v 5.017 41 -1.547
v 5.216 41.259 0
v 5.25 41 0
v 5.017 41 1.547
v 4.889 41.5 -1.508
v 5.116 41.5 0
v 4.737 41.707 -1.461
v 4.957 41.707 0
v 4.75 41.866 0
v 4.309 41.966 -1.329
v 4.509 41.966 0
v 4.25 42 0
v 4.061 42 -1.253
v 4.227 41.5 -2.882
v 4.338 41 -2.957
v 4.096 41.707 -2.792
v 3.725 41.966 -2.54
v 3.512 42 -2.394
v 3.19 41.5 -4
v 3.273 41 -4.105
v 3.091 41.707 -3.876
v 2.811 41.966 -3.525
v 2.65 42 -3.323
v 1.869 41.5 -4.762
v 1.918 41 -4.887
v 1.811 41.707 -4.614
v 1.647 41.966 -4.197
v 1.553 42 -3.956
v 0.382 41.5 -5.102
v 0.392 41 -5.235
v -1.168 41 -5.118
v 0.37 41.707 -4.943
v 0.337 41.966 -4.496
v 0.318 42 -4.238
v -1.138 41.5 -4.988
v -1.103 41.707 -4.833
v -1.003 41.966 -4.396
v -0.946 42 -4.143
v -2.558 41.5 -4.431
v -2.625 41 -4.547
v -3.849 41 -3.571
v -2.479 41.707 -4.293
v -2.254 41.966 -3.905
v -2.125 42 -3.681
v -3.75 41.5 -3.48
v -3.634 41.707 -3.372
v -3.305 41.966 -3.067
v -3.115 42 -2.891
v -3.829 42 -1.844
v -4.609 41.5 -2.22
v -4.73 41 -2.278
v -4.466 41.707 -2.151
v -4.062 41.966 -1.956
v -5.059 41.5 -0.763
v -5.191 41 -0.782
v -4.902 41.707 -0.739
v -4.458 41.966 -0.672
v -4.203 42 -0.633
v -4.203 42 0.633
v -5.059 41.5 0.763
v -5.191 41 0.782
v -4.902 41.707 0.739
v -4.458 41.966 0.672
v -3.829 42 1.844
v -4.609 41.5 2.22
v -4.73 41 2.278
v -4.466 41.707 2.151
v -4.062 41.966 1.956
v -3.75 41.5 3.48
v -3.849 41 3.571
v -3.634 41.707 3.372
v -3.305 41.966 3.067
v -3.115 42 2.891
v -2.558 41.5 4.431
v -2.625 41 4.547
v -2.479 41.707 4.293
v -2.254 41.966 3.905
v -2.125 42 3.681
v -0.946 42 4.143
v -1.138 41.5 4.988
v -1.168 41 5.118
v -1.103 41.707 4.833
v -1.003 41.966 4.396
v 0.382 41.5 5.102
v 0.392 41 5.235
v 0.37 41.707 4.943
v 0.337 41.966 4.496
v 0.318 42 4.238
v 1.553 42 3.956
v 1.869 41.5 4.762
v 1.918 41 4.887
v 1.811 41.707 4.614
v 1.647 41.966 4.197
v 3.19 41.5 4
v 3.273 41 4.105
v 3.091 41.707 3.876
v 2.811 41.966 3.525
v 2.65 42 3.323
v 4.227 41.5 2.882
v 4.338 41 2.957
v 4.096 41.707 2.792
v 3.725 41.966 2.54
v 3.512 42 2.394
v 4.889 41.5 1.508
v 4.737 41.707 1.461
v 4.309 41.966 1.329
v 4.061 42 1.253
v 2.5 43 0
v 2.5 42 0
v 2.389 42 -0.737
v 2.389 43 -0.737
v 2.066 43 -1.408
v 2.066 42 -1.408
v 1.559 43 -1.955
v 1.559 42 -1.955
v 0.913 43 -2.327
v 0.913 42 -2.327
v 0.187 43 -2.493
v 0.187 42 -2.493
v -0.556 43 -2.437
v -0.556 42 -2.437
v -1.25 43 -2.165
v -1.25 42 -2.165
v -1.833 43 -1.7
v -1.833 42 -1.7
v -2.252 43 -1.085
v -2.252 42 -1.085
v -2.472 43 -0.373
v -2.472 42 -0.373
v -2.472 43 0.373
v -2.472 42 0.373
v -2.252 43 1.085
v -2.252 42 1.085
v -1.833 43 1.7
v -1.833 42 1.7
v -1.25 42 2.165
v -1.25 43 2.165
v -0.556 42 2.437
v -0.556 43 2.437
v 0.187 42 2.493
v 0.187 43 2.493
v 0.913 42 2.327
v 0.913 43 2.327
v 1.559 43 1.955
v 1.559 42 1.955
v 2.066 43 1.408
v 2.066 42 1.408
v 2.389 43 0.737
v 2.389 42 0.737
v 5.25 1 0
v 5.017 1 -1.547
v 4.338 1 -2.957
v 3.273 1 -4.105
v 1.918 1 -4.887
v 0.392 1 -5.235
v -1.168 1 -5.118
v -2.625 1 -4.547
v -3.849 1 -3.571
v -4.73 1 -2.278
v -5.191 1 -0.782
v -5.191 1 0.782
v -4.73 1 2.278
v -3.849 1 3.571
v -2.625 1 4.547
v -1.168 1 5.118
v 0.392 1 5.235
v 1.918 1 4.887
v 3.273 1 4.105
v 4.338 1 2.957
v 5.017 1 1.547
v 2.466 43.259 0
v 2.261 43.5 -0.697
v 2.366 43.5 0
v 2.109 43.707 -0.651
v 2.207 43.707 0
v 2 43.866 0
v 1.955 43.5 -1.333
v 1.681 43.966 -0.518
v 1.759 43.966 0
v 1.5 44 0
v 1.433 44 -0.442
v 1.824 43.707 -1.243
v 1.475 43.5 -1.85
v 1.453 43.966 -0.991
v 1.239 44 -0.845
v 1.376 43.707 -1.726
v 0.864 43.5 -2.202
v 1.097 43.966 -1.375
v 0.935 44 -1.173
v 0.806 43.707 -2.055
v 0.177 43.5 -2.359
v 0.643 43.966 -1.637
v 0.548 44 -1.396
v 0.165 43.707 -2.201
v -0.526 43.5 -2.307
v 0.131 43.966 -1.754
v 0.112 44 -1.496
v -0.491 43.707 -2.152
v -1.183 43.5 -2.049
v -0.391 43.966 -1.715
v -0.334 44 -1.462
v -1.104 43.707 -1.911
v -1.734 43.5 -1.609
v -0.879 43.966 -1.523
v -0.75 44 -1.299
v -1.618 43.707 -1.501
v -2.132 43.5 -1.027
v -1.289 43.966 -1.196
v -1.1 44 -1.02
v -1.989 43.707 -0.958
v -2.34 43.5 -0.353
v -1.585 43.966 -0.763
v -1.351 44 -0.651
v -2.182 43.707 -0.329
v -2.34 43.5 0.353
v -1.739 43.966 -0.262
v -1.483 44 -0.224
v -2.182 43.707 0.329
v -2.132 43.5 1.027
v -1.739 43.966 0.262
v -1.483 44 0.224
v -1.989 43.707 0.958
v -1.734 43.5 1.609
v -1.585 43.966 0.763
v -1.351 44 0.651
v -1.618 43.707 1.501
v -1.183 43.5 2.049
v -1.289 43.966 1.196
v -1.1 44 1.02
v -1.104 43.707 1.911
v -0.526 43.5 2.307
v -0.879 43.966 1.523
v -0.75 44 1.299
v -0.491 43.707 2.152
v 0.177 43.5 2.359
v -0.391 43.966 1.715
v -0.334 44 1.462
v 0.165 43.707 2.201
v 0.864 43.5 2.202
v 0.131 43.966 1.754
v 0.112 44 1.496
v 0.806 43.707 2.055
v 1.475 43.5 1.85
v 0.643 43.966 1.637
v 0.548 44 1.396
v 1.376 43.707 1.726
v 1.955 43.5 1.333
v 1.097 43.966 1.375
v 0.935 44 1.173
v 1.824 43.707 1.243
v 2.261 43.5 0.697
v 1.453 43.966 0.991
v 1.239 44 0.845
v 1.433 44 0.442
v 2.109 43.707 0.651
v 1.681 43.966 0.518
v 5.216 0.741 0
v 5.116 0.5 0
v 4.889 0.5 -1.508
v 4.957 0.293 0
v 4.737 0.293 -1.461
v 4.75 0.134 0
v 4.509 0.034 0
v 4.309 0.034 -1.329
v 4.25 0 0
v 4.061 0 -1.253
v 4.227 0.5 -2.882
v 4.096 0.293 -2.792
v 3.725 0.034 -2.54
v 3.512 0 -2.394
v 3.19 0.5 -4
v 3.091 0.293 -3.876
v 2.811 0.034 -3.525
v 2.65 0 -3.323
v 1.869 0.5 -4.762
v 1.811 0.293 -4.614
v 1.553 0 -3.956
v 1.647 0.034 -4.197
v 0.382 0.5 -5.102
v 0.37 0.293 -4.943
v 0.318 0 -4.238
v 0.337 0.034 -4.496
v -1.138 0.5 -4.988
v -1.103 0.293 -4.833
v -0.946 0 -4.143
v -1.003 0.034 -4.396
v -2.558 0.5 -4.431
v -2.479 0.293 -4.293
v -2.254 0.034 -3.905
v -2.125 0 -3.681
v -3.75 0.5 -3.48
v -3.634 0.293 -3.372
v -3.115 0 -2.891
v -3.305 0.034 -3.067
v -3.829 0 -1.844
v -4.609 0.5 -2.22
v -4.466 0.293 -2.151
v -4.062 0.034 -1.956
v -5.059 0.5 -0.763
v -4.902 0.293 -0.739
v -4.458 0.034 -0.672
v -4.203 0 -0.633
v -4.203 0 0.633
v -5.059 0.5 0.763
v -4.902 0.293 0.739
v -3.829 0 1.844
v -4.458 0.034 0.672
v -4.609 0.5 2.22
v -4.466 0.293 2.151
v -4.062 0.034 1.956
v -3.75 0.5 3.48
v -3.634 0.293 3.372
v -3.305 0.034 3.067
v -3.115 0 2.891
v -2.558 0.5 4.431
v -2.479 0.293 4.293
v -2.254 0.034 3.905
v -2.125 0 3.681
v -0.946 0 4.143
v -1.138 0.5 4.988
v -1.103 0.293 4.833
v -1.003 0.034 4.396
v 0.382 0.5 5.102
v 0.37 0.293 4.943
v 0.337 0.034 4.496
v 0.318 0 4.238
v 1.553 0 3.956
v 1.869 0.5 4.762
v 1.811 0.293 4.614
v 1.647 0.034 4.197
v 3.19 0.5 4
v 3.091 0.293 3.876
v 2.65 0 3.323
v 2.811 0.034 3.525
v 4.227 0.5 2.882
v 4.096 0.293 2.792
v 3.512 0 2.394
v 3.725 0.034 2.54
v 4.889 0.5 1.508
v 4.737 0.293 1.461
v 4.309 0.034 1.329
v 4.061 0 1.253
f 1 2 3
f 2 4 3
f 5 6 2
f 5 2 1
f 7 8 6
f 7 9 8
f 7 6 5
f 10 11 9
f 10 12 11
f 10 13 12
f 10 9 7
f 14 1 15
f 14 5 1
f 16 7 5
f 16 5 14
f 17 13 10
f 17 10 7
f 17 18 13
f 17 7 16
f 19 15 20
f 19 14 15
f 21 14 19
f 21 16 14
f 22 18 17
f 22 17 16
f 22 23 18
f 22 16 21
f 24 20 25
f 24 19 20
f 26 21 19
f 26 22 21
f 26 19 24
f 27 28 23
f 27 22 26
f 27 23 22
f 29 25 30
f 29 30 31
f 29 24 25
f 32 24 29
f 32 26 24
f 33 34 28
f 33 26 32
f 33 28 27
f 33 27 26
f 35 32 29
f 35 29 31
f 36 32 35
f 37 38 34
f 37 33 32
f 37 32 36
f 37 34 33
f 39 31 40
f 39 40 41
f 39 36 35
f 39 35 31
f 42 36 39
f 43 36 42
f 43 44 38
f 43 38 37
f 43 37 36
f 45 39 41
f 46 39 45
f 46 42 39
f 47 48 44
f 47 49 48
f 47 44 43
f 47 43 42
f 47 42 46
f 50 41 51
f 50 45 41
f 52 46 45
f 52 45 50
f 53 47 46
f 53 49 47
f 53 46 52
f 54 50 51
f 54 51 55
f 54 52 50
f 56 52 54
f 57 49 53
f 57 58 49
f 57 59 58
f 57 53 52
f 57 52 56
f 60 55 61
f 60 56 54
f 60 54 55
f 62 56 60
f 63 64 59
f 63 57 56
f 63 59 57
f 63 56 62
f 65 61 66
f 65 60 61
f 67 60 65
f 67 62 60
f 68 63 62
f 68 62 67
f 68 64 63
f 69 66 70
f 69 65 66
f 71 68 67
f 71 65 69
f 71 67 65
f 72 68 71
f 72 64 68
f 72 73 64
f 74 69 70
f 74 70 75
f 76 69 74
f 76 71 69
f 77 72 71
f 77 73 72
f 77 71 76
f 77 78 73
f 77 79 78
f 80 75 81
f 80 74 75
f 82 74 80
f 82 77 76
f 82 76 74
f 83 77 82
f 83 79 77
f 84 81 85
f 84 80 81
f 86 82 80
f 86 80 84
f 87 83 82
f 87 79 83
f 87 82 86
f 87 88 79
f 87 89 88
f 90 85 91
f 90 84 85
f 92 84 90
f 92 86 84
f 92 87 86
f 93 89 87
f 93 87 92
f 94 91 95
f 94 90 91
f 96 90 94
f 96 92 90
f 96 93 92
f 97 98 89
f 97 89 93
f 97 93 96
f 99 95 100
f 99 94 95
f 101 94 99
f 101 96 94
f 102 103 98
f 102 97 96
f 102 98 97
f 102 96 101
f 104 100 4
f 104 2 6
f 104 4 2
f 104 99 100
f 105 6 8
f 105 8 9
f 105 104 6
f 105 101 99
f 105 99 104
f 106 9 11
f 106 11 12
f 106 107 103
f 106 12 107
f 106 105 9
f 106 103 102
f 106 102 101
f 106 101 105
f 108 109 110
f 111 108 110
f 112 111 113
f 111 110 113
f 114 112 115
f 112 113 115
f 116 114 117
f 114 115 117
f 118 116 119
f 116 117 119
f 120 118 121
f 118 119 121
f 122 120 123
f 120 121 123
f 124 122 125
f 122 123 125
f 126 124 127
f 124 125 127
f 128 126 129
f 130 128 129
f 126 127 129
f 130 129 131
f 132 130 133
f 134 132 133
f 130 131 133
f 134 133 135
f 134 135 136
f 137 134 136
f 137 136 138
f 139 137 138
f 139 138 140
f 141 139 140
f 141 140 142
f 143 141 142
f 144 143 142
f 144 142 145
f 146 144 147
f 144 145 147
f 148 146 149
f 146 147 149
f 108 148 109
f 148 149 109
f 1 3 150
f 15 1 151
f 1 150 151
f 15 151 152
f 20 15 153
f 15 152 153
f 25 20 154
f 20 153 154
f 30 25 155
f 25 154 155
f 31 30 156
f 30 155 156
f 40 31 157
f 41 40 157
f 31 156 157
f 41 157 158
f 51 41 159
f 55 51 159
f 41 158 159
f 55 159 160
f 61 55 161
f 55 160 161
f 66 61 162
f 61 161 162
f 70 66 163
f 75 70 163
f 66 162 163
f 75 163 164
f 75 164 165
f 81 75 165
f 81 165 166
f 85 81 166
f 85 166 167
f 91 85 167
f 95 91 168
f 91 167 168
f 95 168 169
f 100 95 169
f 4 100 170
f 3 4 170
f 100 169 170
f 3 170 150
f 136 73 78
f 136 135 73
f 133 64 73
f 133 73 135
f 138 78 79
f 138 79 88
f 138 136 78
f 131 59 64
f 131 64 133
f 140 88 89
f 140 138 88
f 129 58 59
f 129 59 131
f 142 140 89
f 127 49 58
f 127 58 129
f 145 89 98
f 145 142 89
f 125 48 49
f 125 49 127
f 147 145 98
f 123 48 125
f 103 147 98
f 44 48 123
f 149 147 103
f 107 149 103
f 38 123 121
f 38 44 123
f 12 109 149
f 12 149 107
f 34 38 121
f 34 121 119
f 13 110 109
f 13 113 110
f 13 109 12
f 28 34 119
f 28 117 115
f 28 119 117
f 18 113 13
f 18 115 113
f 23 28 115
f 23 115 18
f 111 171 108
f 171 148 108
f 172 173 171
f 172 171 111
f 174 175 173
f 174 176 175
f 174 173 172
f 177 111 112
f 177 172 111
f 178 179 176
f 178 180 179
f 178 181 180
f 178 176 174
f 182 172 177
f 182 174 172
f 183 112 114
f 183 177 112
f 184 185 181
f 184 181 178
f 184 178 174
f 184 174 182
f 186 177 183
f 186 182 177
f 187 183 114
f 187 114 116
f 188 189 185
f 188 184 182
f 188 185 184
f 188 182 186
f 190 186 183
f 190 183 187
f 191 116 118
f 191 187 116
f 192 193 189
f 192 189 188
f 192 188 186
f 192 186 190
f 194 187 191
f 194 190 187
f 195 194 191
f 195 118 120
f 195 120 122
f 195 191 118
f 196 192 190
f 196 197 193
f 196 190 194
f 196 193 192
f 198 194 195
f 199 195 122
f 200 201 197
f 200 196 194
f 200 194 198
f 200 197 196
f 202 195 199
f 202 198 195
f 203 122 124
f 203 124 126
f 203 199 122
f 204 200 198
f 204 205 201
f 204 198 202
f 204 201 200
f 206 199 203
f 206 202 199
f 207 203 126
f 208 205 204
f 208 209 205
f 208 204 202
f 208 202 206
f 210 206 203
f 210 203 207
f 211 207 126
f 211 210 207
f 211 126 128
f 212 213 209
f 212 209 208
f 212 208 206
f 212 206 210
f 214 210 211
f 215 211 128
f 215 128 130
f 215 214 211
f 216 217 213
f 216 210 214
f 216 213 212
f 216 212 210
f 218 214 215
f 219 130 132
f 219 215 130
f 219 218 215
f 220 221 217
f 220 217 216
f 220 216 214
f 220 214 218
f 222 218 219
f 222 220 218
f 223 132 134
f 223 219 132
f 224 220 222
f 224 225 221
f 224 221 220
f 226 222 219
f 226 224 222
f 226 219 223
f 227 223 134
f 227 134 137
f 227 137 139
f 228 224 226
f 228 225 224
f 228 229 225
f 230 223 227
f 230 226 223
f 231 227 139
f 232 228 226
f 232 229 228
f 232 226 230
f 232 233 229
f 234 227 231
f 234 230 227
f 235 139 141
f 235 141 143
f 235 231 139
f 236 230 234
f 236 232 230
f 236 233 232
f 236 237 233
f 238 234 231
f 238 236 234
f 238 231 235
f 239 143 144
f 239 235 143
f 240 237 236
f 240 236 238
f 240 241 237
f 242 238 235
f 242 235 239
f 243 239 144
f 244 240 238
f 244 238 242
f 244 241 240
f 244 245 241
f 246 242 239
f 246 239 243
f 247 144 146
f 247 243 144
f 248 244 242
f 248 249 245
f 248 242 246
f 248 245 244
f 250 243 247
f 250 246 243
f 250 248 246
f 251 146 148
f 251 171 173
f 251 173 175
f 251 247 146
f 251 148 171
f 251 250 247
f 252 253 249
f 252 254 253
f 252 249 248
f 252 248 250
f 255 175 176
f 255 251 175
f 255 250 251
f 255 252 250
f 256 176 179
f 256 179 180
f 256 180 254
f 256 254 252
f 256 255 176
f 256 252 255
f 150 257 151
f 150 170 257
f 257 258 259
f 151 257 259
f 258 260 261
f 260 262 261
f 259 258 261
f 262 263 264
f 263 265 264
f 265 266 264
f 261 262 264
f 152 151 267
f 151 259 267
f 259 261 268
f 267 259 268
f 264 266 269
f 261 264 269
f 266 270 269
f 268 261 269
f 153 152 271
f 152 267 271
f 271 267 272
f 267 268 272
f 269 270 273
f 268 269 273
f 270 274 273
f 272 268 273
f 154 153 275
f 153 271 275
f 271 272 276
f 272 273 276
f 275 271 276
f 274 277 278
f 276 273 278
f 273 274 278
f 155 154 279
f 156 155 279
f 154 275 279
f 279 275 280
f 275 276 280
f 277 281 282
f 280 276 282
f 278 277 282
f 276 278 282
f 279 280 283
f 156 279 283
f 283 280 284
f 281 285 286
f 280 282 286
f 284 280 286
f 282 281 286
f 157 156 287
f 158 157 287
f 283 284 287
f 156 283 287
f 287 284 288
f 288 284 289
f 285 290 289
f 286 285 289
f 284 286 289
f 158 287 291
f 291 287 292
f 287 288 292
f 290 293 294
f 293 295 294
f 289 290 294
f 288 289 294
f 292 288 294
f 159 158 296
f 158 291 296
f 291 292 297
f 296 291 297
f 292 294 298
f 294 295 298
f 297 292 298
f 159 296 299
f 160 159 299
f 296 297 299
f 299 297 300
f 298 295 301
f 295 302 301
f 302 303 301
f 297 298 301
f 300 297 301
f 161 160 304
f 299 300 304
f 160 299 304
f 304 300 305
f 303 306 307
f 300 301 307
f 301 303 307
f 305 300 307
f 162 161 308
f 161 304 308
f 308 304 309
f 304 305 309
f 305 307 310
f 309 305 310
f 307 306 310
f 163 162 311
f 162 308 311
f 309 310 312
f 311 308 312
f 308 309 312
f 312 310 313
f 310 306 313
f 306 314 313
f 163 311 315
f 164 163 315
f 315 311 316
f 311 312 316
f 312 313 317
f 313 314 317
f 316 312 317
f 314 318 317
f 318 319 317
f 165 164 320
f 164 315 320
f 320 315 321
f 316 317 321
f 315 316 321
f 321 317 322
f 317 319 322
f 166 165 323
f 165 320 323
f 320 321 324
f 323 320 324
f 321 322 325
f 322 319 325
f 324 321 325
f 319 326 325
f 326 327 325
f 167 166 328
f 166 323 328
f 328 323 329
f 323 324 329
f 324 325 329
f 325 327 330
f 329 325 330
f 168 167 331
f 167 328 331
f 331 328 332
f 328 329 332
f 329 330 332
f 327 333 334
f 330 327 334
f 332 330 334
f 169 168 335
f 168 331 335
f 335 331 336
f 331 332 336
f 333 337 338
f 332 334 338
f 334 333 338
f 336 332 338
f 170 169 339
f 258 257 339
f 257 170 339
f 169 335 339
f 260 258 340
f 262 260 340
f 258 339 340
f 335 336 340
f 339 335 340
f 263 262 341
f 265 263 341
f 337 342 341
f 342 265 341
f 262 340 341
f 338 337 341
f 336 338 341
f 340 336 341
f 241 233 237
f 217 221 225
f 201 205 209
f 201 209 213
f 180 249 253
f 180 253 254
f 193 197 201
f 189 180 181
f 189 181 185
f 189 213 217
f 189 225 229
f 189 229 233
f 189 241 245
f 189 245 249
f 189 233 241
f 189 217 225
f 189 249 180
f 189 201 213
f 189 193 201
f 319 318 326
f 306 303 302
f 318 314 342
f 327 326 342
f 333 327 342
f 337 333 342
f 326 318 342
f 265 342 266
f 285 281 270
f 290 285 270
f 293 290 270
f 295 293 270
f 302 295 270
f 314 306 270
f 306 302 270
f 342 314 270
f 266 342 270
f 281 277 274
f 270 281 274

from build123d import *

# Parameters (mm, degrees)
SKETCH1_R           = 5.25
BOSS_EXTRUDE1_DEPTH = 42
SKETCH2_R           = 2.5
BOSS_EXTRUDE2_DEPTH = 2
FILLET1_R           = 1


with BuildPart() as part:
    # Sketch1 → Boss-Extrude1 (new body)
    with BuildSketch(Plane(origin=(0, 0, 0), x_dir=(1, 0, 0), z_dir=(0, 1, 0))):
        Circle(SKETCH1_R)
    extrude(amount=BOSS_EXTRUDE1_DEPTH)

    # Sketch2 → Boss-Extrude2 (add)
    with BuildSketch(Plane(origin=(0, 42, 0), x_dir=(1, 0, 0), z_dir=(0, 1, 0))):
        Circle(SKETCH2_R)
    extrude(amount=BOSS_EXTRUDE2_DEPTH)

    # Fillet1
    fillet1_edges = [part.edges().sort_by_distance(p)[0] for p in [
        (-5.25, 0, 0),
        (-5.25, 42, 0),
        (-2.5, 44, 0),
    ]]
    fillet(fillet1_edges, radius=FILLET1_R)


solid = part.part
